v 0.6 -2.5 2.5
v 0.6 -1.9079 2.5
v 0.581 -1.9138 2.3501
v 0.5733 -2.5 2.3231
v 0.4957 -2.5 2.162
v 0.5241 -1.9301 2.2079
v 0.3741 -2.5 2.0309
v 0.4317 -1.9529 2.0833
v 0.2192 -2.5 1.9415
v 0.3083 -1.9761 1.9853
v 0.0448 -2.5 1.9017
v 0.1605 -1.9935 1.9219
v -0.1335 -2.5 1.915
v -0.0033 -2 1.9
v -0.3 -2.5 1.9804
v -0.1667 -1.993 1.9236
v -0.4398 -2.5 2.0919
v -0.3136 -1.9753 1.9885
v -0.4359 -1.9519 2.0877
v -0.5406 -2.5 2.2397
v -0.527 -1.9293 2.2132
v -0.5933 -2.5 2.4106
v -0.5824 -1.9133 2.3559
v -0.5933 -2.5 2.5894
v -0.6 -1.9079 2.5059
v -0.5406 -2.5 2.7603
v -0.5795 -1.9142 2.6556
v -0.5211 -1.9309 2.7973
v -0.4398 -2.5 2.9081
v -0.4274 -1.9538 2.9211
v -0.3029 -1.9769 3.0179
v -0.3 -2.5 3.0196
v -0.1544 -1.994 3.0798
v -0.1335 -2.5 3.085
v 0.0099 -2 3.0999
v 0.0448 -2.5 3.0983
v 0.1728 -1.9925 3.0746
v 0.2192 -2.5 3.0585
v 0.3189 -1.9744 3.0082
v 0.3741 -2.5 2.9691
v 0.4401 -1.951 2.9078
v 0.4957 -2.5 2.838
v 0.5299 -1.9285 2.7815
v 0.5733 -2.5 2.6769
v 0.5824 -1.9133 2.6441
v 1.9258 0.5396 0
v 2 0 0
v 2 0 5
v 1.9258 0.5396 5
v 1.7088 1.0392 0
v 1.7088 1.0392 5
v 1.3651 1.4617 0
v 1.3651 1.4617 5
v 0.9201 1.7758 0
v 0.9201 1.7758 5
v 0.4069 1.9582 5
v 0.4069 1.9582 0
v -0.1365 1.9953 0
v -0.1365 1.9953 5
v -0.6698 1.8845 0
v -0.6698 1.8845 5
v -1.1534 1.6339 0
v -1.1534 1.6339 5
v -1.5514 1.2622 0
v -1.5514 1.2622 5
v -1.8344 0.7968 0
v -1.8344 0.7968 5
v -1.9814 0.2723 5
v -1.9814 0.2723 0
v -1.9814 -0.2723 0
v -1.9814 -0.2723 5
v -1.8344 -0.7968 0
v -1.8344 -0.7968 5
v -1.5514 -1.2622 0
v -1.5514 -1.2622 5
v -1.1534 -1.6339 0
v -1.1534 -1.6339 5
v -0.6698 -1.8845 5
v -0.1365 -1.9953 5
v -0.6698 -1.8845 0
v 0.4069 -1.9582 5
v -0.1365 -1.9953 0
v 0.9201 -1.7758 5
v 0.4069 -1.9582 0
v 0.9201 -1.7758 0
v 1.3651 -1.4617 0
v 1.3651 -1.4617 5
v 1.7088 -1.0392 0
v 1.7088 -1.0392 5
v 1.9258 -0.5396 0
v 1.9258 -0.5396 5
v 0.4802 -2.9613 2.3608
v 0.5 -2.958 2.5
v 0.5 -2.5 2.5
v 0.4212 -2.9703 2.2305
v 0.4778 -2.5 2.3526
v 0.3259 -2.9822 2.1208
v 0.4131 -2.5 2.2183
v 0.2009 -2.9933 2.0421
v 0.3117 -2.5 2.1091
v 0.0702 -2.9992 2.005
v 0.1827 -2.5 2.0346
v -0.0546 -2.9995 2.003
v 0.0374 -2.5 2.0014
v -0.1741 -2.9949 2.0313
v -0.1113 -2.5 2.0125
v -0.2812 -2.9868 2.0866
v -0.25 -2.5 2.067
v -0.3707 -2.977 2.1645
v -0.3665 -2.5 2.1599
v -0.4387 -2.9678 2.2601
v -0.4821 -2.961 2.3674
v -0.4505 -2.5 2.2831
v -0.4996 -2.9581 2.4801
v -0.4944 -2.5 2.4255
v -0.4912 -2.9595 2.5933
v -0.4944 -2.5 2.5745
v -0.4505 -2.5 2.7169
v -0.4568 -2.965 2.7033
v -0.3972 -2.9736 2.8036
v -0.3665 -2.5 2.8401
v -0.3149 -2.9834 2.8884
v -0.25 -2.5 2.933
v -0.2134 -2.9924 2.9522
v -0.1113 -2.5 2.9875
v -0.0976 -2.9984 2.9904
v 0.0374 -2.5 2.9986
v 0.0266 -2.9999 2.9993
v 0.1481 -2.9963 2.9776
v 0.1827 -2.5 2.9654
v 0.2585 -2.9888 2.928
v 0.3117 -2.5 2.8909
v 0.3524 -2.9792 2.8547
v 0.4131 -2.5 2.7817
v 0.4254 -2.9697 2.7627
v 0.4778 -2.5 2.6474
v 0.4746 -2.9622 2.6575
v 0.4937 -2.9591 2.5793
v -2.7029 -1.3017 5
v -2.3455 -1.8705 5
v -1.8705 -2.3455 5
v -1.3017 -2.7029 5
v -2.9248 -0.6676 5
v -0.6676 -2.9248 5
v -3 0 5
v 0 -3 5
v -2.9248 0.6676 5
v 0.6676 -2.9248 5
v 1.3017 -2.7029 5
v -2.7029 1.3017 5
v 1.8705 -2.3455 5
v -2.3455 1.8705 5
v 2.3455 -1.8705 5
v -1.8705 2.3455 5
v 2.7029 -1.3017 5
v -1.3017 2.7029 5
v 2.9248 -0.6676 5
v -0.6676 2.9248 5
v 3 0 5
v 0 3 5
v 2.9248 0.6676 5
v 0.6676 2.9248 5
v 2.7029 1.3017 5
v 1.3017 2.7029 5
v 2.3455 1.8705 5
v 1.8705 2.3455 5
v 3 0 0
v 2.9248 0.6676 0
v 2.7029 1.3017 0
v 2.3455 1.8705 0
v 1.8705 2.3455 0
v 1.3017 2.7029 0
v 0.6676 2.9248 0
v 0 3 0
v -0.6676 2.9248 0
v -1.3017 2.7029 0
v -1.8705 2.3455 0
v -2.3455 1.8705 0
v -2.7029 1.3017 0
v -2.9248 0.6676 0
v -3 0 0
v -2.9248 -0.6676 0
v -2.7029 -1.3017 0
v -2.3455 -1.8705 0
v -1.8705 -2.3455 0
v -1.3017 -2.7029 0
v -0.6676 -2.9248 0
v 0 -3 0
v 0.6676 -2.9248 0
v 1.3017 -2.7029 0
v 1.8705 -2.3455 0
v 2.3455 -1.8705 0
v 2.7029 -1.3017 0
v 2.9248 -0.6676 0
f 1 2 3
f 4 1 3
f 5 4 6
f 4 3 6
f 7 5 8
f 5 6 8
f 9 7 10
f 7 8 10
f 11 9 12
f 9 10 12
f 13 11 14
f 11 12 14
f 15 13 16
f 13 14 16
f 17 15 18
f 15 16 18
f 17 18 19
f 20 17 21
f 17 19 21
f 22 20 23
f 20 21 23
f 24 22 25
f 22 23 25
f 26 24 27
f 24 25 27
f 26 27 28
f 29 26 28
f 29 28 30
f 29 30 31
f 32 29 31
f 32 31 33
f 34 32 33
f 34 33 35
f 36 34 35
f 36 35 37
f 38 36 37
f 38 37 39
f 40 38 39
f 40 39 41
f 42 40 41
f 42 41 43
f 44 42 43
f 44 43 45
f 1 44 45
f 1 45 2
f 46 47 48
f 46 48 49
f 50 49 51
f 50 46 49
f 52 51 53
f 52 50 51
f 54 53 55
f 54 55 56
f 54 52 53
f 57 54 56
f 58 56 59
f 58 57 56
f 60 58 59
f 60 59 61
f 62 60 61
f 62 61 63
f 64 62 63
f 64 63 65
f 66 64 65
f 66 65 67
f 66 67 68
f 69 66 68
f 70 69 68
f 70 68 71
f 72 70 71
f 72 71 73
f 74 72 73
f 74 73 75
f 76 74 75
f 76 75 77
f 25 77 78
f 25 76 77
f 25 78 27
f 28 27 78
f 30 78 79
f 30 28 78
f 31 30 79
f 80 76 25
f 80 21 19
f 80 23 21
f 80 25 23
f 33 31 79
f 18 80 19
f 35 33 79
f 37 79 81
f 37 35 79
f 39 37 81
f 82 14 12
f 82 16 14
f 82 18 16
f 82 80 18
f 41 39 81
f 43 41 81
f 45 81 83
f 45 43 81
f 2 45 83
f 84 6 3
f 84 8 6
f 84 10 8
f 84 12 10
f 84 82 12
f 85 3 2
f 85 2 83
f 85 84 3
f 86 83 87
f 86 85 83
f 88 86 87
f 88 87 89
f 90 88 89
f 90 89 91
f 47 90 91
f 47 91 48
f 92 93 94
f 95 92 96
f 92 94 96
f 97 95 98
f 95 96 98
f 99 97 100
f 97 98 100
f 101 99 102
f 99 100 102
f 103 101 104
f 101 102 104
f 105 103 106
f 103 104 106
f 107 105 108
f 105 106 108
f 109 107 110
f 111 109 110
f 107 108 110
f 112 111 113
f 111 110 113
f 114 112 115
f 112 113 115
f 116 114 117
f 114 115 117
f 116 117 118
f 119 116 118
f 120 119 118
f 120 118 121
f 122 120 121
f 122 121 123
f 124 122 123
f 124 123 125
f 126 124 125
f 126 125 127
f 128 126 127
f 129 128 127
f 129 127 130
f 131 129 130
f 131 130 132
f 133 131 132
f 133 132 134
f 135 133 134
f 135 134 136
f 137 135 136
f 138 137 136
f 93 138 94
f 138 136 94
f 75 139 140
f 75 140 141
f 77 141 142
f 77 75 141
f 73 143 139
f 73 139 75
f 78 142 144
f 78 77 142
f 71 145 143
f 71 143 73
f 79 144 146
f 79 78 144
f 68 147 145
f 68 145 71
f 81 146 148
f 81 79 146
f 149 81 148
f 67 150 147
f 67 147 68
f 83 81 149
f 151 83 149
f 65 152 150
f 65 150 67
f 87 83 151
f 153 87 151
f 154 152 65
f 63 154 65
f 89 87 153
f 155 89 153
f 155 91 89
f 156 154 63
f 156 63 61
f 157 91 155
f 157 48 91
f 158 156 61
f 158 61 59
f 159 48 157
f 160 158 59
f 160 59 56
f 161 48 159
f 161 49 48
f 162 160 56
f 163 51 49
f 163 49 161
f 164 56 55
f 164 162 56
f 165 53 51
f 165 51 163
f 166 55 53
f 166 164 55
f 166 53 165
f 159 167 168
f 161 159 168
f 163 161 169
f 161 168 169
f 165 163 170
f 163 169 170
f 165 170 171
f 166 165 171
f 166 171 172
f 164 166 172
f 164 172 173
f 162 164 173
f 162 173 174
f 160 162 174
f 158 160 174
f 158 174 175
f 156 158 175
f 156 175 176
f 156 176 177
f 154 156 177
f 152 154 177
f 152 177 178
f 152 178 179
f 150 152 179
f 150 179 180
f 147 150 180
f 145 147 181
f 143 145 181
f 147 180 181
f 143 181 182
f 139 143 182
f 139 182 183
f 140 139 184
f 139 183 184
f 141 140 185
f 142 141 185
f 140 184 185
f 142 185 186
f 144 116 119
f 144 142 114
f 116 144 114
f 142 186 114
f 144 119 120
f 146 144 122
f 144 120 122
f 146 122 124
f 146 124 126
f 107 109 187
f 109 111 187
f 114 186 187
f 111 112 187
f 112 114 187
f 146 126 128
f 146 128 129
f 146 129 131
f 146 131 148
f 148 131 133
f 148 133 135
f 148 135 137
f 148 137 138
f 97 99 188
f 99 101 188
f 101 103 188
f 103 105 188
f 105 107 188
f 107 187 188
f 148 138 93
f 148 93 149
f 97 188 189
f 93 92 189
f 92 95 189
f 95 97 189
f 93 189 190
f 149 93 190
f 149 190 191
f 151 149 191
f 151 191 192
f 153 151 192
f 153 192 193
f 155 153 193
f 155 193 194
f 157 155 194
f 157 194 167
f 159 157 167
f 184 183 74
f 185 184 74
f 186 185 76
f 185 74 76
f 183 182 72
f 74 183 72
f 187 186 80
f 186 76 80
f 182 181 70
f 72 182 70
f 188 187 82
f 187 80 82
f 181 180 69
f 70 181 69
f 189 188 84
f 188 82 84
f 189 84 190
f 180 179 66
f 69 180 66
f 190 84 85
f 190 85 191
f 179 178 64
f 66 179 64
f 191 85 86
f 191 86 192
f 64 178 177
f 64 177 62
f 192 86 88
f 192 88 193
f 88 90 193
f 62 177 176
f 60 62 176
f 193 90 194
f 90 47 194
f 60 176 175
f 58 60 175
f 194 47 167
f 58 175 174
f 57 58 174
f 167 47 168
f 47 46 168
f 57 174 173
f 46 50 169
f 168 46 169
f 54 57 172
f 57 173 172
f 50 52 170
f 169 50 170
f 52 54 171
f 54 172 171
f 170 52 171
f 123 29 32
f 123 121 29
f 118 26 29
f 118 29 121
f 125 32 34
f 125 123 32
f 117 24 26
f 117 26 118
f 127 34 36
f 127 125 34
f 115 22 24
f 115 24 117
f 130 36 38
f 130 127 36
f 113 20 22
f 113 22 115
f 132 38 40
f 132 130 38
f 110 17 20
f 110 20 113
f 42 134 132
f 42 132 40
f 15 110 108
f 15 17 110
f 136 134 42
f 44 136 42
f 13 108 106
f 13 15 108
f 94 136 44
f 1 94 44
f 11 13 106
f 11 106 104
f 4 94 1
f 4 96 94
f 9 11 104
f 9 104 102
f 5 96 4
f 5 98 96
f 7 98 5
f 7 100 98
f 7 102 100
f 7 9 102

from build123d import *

# Parameters (mm, degrees)
SKETCH_1_R          = 3
SKETCH_1_R_2        = 2
EXTRUDE_1_DEPTH     = 5
SKETCH_2_R          = 0.5
CUT_EXTRUDE_1_DEPTH = 5
SKETCH_3_R          = 0.6
CUT_EXTRUDE_2_DEPTH = 2.5


with BuildPart() as part:
    # 草图1 → 凸台-拉伸1 (new body)
    with BuildSketch(Plane.XY):
        Circle(SKETCH_1_R)
        Circle(SKETCH_1_R_2, mode=Mode.SUBTRACT)
    extrude(amount=EXTRUDE_1_DEPTH)

    # 草图2 → 切除-拉伸1 (cut)
    with BuildSketch(Plane(origin=(0, 0, 0), x_dir=(1, 0, 0), z_dir=(0, 1, 0))):
        with Locations((0, -2.5)):
            Circle(SKETCH_2_R)
    extrude(amount=-CUT_EXTRUDE_1_DEPTH, mode=Mode.SUBTRACT)

    # 草图3 → 切除-拉伸2 (cut)
    with BuildSketch(Plane(origin=(0, 0, 0), x_dir=(1, 0, 0), z_dir=(0, 1, 0))):
        with Locations((0, -2.5)):
            Circle(SKETCH_3_R)
    extrude(amount=-CUT_EXTRUDE_2_DEPTH, mode=Mode.SUBTRACT)


solid = part.part
